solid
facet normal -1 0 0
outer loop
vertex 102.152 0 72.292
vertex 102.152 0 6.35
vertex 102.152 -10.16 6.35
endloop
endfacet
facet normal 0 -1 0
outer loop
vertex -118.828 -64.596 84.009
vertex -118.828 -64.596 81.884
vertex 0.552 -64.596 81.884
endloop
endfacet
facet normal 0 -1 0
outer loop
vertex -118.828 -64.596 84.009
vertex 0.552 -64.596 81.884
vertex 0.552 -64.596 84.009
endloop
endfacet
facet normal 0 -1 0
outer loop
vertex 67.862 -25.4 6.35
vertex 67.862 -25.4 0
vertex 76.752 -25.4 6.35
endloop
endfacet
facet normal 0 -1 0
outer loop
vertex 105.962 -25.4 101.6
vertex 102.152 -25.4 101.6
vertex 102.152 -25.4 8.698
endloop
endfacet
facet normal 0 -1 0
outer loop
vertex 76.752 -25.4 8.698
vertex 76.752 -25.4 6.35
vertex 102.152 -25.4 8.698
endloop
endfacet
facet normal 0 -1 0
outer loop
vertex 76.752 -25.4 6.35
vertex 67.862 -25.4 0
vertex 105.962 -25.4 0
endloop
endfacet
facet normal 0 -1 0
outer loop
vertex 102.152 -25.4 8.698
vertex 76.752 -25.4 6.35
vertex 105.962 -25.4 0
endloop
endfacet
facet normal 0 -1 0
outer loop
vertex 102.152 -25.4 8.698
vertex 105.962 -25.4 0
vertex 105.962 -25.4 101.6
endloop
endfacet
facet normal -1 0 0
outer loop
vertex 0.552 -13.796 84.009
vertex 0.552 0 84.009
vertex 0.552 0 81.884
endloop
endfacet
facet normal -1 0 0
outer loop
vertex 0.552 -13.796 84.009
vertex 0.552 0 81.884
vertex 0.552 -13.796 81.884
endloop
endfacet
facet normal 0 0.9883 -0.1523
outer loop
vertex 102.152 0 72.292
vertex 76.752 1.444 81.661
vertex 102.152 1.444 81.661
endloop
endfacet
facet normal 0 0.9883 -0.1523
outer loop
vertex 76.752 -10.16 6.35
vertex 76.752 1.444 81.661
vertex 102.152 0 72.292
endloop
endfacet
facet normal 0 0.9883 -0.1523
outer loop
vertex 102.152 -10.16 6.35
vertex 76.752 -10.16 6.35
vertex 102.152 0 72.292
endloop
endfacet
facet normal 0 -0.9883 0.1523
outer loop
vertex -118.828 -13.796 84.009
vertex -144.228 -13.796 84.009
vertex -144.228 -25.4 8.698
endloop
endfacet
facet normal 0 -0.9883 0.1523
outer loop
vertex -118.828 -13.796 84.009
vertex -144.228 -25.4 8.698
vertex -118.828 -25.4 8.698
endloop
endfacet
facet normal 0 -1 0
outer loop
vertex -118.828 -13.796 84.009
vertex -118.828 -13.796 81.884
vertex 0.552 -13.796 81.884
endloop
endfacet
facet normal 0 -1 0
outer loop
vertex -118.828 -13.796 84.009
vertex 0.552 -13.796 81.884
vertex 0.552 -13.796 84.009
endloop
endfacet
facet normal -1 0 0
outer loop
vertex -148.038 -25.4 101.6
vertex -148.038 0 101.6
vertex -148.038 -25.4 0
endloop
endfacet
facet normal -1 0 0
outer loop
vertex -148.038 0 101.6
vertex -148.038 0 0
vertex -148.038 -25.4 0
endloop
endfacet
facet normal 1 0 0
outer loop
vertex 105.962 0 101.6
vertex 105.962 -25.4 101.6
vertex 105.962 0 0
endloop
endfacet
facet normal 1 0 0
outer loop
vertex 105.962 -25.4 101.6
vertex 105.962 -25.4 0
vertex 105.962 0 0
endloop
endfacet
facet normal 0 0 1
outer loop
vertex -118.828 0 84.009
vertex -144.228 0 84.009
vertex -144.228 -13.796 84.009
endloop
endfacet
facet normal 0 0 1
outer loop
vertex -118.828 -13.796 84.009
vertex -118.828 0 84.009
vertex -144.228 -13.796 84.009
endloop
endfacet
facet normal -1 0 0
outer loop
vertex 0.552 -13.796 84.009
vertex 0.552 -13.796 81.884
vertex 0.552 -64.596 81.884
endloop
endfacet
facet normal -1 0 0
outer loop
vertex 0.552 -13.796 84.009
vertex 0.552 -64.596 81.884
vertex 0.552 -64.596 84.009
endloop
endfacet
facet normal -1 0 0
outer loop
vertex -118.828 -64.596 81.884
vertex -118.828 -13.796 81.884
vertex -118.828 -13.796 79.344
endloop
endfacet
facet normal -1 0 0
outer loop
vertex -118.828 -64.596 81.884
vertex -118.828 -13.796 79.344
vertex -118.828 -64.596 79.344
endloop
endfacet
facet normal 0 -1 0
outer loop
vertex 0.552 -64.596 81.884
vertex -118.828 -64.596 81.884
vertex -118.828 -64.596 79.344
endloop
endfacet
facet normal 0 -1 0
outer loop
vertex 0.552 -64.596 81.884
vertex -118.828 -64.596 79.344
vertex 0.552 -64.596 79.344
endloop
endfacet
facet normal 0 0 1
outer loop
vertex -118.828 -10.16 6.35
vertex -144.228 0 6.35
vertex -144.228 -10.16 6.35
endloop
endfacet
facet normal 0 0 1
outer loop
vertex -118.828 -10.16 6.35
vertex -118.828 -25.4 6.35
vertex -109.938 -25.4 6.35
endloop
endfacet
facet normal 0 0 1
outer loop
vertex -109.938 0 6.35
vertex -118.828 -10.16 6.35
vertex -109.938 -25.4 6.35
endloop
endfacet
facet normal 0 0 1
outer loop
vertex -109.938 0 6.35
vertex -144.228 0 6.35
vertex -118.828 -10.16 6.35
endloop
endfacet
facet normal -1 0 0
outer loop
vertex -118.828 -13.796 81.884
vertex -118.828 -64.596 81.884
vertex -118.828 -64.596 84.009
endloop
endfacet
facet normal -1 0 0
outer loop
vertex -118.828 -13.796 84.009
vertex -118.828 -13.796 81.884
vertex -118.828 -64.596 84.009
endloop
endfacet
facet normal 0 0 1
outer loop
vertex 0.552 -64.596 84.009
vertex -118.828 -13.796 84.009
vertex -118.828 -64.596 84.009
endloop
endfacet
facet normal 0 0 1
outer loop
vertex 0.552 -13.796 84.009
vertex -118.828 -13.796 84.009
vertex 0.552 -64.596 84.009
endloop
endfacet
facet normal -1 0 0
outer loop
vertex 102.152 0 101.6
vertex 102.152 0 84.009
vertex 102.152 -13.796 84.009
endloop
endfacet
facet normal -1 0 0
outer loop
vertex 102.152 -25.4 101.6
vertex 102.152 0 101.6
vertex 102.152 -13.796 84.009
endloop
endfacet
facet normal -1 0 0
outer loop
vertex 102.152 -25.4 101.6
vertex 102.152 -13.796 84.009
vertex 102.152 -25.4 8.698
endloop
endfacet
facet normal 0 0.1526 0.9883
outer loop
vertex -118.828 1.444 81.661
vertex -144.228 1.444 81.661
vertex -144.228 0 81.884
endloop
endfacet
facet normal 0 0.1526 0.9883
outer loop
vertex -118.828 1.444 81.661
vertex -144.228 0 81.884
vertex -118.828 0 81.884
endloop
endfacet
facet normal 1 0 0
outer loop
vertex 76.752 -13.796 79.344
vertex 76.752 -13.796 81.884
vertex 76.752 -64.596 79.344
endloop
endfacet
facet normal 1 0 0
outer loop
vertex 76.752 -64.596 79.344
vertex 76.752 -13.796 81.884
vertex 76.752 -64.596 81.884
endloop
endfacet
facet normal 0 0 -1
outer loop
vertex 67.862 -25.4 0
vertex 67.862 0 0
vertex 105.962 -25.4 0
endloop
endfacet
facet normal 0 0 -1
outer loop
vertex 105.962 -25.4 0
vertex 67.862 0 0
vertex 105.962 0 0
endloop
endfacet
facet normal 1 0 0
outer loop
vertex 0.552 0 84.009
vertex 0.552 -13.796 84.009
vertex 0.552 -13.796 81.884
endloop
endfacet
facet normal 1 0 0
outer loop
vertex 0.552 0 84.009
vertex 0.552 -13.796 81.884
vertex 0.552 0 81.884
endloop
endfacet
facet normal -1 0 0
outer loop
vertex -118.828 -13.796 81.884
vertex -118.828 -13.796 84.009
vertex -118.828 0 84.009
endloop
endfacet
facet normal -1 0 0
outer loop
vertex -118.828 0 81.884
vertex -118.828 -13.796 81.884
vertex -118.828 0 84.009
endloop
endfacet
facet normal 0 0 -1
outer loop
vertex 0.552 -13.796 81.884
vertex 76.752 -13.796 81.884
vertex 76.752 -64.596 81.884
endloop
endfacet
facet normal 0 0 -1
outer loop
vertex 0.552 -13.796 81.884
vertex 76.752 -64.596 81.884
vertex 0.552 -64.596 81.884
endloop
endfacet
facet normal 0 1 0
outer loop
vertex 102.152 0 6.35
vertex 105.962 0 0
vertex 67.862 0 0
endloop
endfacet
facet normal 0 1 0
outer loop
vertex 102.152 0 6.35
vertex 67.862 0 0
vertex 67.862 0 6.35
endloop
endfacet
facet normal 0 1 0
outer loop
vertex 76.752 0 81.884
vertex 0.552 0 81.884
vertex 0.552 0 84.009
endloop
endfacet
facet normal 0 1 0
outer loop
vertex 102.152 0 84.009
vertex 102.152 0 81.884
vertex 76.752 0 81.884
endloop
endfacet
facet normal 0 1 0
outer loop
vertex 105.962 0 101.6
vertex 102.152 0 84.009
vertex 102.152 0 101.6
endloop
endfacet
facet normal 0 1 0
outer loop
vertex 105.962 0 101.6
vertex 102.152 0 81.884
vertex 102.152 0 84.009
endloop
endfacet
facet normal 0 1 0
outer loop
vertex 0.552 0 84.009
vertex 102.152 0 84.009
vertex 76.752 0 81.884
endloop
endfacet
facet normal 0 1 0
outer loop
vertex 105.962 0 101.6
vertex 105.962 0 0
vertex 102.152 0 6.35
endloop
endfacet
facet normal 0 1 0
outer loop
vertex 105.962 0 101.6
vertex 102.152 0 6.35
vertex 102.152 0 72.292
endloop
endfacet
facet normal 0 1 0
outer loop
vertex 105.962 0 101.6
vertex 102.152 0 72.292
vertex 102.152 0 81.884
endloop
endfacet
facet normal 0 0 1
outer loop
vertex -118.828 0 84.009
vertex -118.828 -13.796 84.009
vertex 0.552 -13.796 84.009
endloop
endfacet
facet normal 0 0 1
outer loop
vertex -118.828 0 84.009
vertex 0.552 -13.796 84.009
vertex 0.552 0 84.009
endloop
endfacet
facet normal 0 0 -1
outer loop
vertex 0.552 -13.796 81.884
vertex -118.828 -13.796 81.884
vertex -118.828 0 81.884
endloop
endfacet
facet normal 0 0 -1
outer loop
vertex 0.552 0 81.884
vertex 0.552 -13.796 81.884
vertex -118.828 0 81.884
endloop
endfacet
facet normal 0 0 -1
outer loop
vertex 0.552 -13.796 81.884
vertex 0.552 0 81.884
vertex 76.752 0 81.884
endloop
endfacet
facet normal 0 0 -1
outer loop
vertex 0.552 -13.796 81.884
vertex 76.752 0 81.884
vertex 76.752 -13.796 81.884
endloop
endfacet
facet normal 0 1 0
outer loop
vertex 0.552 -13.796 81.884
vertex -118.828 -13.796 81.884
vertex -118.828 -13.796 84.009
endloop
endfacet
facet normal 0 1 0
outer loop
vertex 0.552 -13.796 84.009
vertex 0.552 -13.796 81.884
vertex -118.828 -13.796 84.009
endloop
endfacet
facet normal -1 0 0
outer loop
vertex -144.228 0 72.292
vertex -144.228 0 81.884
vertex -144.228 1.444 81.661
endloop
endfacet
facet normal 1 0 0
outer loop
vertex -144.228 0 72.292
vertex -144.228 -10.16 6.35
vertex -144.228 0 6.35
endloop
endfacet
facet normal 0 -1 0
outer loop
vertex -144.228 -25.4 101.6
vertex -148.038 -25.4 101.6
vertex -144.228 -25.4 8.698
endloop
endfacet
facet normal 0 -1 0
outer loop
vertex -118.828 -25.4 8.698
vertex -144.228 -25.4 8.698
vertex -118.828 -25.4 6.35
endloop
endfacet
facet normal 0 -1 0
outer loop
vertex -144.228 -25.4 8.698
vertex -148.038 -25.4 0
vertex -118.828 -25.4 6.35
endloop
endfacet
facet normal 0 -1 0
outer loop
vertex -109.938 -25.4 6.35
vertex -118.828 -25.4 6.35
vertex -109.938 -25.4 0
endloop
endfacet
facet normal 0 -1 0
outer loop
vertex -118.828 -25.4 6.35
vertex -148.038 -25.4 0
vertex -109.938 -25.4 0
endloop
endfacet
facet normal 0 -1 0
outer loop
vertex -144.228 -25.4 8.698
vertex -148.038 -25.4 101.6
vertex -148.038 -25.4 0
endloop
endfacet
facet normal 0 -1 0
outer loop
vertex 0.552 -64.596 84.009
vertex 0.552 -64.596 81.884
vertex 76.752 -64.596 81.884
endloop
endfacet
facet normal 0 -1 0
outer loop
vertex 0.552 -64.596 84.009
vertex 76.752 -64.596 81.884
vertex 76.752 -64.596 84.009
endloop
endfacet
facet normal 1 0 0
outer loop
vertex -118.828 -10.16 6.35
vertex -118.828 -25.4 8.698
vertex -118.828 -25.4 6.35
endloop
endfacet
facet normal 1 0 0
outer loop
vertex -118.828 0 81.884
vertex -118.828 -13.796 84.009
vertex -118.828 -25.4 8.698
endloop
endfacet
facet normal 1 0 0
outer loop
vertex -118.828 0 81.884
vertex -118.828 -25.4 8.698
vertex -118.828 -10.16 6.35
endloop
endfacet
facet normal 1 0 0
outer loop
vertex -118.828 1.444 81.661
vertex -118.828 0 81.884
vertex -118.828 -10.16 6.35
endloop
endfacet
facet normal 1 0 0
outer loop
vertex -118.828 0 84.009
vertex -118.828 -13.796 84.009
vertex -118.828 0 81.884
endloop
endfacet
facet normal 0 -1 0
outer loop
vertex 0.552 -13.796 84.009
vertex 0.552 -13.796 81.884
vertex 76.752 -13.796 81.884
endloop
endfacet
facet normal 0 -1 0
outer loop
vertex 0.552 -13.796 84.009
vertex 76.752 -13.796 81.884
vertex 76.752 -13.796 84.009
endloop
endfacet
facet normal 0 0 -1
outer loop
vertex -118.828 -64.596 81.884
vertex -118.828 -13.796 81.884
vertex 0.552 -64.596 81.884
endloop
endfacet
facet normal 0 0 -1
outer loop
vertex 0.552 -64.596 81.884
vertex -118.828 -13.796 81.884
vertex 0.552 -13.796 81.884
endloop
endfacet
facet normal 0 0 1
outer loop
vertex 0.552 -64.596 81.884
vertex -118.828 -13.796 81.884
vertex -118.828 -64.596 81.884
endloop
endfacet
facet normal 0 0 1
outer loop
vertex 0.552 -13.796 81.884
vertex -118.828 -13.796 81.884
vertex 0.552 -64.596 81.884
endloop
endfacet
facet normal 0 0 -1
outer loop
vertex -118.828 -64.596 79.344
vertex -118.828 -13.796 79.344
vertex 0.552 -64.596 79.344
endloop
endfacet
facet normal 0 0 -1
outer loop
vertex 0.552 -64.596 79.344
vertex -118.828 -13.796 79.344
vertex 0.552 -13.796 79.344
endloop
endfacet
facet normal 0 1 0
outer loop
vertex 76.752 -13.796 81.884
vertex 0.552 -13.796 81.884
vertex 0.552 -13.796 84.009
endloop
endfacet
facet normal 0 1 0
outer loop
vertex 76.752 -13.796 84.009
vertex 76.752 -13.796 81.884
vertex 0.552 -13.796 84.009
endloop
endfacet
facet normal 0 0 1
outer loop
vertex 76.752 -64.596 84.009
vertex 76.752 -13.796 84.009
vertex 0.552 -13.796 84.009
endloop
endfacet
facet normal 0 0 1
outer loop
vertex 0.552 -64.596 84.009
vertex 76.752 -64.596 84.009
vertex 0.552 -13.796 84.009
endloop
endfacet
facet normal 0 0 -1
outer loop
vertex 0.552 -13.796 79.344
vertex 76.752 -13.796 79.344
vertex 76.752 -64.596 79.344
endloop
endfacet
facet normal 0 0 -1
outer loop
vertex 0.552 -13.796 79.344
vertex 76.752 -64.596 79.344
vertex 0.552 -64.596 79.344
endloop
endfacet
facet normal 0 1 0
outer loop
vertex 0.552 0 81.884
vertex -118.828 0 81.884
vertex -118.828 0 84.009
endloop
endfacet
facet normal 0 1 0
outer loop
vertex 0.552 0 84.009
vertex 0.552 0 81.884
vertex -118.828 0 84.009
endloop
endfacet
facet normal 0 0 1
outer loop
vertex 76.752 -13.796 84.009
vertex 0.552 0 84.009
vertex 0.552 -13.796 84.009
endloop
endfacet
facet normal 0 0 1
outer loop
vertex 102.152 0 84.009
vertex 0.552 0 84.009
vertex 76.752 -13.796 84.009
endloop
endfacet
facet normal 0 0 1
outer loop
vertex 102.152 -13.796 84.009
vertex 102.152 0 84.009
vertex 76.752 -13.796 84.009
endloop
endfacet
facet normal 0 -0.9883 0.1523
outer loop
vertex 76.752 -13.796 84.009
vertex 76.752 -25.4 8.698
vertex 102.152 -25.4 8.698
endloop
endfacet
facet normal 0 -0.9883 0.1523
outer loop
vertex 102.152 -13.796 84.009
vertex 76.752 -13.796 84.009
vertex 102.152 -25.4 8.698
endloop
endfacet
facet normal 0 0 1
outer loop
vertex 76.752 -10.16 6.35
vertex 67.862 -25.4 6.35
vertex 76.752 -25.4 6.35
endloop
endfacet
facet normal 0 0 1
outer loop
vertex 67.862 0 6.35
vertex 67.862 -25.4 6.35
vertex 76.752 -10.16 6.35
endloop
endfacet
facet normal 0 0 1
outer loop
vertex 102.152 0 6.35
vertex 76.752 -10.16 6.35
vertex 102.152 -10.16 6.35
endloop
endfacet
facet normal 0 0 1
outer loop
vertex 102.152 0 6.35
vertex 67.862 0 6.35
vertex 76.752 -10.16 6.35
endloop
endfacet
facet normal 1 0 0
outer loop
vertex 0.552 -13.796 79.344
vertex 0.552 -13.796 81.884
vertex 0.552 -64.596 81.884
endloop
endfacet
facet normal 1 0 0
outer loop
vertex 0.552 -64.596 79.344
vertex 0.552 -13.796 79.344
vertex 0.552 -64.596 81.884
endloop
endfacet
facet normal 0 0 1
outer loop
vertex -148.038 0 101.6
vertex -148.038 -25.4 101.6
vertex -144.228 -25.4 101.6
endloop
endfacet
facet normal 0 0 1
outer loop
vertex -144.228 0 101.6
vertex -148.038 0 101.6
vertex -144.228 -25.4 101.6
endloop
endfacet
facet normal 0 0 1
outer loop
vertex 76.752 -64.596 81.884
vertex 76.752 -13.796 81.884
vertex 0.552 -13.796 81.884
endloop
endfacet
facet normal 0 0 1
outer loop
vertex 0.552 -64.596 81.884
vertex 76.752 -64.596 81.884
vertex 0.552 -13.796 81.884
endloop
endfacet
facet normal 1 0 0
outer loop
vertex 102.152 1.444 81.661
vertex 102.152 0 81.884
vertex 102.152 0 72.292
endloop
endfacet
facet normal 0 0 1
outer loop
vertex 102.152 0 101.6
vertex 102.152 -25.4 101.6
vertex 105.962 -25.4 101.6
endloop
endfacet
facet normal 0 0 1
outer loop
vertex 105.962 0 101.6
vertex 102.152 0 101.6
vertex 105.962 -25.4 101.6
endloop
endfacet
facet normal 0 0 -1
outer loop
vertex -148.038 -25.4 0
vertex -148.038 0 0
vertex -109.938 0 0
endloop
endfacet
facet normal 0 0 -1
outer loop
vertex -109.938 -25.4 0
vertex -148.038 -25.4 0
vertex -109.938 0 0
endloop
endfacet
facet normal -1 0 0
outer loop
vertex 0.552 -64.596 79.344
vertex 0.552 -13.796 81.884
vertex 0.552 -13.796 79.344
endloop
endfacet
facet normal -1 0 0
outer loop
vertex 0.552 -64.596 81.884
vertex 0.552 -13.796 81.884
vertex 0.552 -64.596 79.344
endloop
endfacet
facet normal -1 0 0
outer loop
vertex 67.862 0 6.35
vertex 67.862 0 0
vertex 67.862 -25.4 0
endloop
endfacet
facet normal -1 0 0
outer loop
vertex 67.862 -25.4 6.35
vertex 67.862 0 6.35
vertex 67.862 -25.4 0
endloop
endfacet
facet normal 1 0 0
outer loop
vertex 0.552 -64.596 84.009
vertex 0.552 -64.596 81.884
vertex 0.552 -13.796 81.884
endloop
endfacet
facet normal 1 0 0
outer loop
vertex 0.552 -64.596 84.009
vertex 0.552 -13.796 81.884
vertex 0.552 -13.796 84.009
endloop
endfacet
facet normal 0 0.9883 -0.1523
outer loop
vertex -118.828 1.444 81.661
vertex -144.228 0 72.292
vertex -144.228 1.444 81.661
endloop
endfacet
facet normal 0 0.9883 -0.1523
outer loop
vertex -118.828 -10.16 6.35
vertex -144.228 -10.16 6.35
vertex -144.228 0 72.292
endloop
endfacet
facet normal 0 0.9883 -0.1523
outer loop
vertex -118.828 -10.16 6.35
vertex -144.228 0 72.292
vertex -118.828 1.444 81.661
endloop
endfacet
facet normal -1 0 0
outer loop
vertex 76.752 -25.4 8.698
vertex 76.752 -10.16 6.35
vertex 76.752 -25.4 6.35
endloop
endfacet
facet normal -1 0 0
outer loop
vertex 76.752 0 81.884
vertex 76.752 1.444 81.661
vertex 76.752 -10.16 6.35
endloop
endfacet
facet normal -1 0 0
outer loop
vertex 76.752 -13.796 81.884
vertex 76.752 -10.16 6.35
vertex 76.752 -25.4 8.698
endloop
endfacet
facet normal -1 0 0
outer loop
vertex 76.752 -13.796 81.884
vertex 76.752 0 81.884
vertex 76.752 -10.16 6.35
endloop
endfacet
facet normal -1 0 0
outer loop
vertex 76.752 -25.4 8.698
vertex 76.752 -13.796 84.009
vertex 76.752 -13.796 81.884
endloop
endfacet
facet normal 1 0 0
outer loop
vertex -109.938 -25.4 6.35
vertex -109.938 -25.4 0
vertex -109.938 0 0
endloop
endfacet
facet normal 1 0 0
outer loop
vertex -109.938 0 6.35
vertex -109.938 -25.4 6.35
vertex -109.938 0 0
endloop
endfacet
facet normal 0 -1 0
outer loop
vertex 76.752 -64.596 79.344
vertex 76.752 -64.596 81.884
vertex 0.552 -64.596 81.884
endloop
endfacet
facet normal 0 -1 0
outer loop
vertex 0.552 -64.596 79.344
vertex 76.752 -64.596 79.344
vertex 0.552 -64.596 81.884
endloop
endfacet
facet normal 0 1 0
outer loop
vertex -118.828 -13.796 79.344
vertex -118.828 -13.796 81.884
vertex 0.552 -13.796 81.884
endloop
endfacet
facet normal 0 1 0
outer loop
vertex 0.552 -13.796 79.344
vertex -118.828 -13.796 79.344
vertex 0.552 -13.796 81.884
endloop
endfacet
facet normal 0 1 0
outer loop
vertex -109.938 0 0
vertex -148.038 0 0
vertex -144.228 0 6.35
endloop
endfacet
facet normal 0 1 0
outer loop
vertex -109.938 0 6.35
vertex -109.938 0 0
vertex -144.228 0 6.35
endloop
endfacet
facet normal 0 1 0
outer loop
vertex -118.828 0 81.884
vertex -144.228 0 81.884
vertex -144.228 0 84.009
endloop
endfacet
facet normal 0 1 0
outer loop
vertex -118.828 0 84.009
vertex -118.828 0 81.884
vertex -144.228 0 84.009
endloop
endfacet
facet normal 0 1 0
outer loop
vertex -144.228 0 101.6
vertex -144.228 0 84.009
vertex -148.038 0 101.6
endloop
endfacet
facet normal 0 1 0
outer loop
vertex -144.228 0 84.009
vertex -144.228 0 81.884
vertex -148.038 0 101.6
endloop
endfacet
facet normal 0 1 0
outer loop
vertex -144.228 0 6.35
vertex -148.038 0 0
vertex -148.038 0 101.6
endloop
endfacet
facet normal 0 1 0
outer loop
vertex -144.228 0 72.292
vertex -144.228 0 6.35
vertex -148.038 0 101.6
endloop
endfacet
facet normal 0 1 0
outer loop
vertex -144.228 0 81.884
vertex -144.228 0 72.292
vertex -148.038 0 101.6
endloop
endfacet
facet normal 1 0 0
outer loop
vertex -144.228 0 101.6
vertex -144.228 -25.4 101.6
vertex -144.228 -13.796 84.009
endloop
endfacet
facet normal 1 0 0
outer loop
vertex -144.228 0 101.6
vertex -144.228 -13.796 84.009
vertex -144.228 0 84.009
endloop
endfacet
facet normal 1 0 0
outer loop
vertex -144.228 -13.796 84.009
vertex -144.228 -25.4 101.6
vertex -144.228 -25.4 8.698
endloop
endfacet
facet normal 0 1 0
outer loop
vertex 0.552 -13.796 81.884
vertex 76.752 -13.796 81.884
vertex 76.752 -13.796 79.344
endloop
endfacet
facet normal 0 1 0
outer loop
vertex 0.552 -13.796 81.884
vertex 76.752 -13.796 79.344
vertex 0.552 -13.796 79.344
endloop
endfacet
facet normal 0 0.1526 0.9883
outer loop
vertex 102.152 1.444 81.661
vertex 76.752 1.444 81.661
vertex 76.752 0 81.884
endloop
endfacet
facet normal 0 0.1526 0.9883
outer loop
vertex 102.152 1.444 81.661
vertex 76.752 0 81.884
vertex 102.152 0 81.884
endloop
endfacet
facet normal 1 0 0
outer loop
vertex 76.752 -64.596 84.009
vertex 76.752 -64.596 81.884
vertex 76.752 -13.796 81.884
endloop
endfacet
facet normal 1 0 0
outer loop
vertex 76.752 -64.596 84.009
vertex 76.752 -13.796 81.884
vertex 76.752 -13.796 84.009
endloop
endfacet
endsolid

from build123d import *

# Parameters (mm, degrees)
F1_DEPTH  = 6.35
F2_DEPTH  = 6.35
F3_DEPTH  = 25.4
F4_DEPTH  = 25.4
F6_DEPTH  = 25.4
F8_DEPTH  = 25.4
F10_W     = 25.4
F10_H     = 15.419832
F11_DEPTH = 76.2
F9_W      = 25.4
F9_H      = 15.4198326926
F12_DEPTH = 76.2
F14_DEPTH = 76.2
F16_DEPTH = 76.2
F18_DEPTH = 25.4
F20_W     = 13.7963745518
F20_H     = 2.1256824252
F21_DEPTH = 76.2
F22_DEPTH = 25.4
F23_W     = 13.7963525968
F23_H     = 2.12568316
F24_DEPTH = 119.38
F25_DEPTH = 50.8
F26_DEPTH = 50.8
F27_DEPTH = 2.54
F28_DEPTH = 2.54


with BuildPart() as f1:
    # F0 (on Top) → F1 (new body)
    with BuildSketch(Plane.XY):
        Polygon((-144.2275191965, 0), (-148.0375191965, 0), (-148.0375191965, -25.4), (-144.2275191965, -25.4), (-144.2275191965, -12.7), align=None)
        Polygon((-109.9375191965, 0), (-144.2275191965, 0), (-144.2275191965, -12.7), (-144.2275191965, -25.4), (-109.9375191965, -25.4), align=None)
    extrude(amount=F1_DEPTH)

    # F0 (on Top) → F3 (join)
    with BuildSketch(Plane.XY):
        Polygon((-144.2275191965, 0), (-148.0375191965, 0), (-148.0375191965, -25.4), (-144.2275191965, -25.4), (-144.2275191965, -12.7), align=None)
    extrude(amount=F3_DEPTH)

    # F5 (on face) → F6 (join)
    with BuildSketch(Plane.YZ.offset(-144.2275191965)):
        Polygon((-20.32, 6.35), (-10.16, 6.35), (-25.4, 8.698114194), (-25.4, 6.35), align=None)
    extrude(amount=F6_DEPTH)

    # F9 (on face) → F12 (join)
    with BuildSketch(Plane(origin=(0, 0.7200947335, 4.6736414124), x_dir=(1, 0, 0), z_dir=(0, 0.1522788373, 0.9883375717))):
        with Locations((-131.5275191965, -18.7183966921)):
            Rectangle(F9_W, F9_H)
    extrude(amount=F12_DEPTH)

    # F15 (on face) → F16 (join)
    with BuildSketch(Plane.XY.offset(25.4)):
        Polygon((-144.2275191965, -7.2248572575), (-144.2275191965, 0), (-148.0375191965, 0), (-148.0375191965, -25.4), (-144.2275191965, -25.4), (-144.2275191965, -22.8266446767), align=None)
    extrude(amount=F16_DEPTH)

    # F19 (on face) → F22 (join)
    with BuildSketch(Plane.YZ.offset(-144.2275191965)):
        Polygon((0, 81.8837540004), (0, 84.0094371603), (-13.7963525968, 84.0094371603), align=None)
    extrude(amount=F22_DEPTH)


with BuildPart() as f2:
    # F0 (on Top) → F2 (new body)
    with BuildSketch(Plane.XY):
        Polygon((67.8624808035, 0), (67.8624808035, -25.4), (102.1524808035, -25.4), (102.1524808035, -18.4480734169), (102.1524808035, 0), align=None)
        Polygon((102.1524808035, -18.4480734169), (102.1524808035, -25.4), (105.9624808035, -25.4), (105.9624808035, 0), (102.1524808035, 0), align=None)
    extrude(amount=F2_DEPTH)

    # F0 (on Top) → F4 (join)
    with BuildSketch(Plane.XY):
        Polygon((102.1524808035, -18.4480734169), (102.1524808035, -25.4), (105.9624808035, -25.4), (105.9624808035, 0), (102.1524808035, 0), align=None)
    extrude(amount=F4_DEPTH)

    # F7 (on face) → F8 (join)
    with BuildSketch(Plane(origin=(102.1524808035, 0, 0), x_dir=(0, -1, 0), z_dir=(-1, 0, 0))):
        Polygon((25.4, 8.6981096457), (10.16, 6.35), (25.4, 6.35), align=None)
    extrude(amount=F8_DEPTH)

    # F10 (on face) → F11 (join)
    with BuildSketch(Plane(origin=(0, 0.7200938597, 4.6736447941), x_dir=(1, 0, 0), z_dir=(0, 0.1522785492, 0.9883376161))):
        with Locations((89.4524808035, -18.7183949672)):
            Rectangle(F10_W, F10_H)
    extrude(amount=F11_DEPTH)

    # F13 (on face) → F14 (join)
    with BuildSketch(Plane.XY.offset(25.4)):
        Polygon((102.1524808035, -7.2248629429), (102.1524808035, -22.8266489605), (102.1524808035, -25.4), (105.9624808035, -25.4), (105.9624808035, 0), (102.1524808035, 0), align=None)
    extrude(amount=F14_DEPTH)

    # F17 (on face) → F18 (join)
    with BuildSketch(Plane(origin=(102.1524808035, 0, 0), x_dir=(0, -1, 0), z_dir=(-1, 0, 0))):
        Polygon((0, 81.8837535695), (13.7963745518, 84.0094359948), (0, 84.0094359948), align=None)
    extrude(amount=F18_DEPTH)

    # F20 (on face) → F21 (join)
    with BuildSketch(Plane(origin=(76.7524808035, 0, 0), x_dir=(0, -1, 0), z_dir=(-1, 0, 0))):
        with Locations((6.8981872759, 82.9465947822)):
            Rectangle(F20_W, F20_H)
    extrude(amount=F21_DEPTH)


with BuildPart() as f24:
    # F23 (on face) → F24 (new body)
    with BuildSketch(Plane.YZ.offset(-118.8275191965)):
        with Locations((-6.8981762984, 82.9465955804)):
            Rectangle(F23_W, F23_H)
    extrude(amount=F24_DEPTH)


with BuildPart() as f25:
    # F25 (new): a face of the model
    f25_faces = [f24.part.faces().sort_by_distance(p)[0] for p in [
        (-59.1375191965, -13.7963525968, 82.9465955804),
    ]]
    extrude(f25_faces, amount=F25_DEPTH)


with BuildPart() as f26:
    # F26 (new): a face of the model
    f26_faces = [f2.part.faces().sort_by_distance(p)[0] for p in [
        (38.6524808035, -13.7963745518, 82.9465947822),
    ]]
    extrude(f26_faces, amount=F26_DEPTH)


with BuildPart() as f27:
    # F27 (new): a face of the model
    f27_faces = [f26.part.faces().sort_by_distance(p)[0] for p in [
        (38.6524808035, -39.1963745518, 81.8837535695),
    ]]
    extrude(f27_faces, amount=F27_DEPTH)


with BuildPart() as f28:
    # F28 (new): a face of the model
    f28_faces = [f25.part.faces().sort_by_distance(p)[0] for p in [
        (-59.1375191965, -39.1963525968, 81.8837540004),
    ]]
    extrude(f28_faces, amount=F28_DEPTH)


solid = Compound([f1.part, f2.part, f24.part, f25.part, f26.part, f27.part, f28.part])
